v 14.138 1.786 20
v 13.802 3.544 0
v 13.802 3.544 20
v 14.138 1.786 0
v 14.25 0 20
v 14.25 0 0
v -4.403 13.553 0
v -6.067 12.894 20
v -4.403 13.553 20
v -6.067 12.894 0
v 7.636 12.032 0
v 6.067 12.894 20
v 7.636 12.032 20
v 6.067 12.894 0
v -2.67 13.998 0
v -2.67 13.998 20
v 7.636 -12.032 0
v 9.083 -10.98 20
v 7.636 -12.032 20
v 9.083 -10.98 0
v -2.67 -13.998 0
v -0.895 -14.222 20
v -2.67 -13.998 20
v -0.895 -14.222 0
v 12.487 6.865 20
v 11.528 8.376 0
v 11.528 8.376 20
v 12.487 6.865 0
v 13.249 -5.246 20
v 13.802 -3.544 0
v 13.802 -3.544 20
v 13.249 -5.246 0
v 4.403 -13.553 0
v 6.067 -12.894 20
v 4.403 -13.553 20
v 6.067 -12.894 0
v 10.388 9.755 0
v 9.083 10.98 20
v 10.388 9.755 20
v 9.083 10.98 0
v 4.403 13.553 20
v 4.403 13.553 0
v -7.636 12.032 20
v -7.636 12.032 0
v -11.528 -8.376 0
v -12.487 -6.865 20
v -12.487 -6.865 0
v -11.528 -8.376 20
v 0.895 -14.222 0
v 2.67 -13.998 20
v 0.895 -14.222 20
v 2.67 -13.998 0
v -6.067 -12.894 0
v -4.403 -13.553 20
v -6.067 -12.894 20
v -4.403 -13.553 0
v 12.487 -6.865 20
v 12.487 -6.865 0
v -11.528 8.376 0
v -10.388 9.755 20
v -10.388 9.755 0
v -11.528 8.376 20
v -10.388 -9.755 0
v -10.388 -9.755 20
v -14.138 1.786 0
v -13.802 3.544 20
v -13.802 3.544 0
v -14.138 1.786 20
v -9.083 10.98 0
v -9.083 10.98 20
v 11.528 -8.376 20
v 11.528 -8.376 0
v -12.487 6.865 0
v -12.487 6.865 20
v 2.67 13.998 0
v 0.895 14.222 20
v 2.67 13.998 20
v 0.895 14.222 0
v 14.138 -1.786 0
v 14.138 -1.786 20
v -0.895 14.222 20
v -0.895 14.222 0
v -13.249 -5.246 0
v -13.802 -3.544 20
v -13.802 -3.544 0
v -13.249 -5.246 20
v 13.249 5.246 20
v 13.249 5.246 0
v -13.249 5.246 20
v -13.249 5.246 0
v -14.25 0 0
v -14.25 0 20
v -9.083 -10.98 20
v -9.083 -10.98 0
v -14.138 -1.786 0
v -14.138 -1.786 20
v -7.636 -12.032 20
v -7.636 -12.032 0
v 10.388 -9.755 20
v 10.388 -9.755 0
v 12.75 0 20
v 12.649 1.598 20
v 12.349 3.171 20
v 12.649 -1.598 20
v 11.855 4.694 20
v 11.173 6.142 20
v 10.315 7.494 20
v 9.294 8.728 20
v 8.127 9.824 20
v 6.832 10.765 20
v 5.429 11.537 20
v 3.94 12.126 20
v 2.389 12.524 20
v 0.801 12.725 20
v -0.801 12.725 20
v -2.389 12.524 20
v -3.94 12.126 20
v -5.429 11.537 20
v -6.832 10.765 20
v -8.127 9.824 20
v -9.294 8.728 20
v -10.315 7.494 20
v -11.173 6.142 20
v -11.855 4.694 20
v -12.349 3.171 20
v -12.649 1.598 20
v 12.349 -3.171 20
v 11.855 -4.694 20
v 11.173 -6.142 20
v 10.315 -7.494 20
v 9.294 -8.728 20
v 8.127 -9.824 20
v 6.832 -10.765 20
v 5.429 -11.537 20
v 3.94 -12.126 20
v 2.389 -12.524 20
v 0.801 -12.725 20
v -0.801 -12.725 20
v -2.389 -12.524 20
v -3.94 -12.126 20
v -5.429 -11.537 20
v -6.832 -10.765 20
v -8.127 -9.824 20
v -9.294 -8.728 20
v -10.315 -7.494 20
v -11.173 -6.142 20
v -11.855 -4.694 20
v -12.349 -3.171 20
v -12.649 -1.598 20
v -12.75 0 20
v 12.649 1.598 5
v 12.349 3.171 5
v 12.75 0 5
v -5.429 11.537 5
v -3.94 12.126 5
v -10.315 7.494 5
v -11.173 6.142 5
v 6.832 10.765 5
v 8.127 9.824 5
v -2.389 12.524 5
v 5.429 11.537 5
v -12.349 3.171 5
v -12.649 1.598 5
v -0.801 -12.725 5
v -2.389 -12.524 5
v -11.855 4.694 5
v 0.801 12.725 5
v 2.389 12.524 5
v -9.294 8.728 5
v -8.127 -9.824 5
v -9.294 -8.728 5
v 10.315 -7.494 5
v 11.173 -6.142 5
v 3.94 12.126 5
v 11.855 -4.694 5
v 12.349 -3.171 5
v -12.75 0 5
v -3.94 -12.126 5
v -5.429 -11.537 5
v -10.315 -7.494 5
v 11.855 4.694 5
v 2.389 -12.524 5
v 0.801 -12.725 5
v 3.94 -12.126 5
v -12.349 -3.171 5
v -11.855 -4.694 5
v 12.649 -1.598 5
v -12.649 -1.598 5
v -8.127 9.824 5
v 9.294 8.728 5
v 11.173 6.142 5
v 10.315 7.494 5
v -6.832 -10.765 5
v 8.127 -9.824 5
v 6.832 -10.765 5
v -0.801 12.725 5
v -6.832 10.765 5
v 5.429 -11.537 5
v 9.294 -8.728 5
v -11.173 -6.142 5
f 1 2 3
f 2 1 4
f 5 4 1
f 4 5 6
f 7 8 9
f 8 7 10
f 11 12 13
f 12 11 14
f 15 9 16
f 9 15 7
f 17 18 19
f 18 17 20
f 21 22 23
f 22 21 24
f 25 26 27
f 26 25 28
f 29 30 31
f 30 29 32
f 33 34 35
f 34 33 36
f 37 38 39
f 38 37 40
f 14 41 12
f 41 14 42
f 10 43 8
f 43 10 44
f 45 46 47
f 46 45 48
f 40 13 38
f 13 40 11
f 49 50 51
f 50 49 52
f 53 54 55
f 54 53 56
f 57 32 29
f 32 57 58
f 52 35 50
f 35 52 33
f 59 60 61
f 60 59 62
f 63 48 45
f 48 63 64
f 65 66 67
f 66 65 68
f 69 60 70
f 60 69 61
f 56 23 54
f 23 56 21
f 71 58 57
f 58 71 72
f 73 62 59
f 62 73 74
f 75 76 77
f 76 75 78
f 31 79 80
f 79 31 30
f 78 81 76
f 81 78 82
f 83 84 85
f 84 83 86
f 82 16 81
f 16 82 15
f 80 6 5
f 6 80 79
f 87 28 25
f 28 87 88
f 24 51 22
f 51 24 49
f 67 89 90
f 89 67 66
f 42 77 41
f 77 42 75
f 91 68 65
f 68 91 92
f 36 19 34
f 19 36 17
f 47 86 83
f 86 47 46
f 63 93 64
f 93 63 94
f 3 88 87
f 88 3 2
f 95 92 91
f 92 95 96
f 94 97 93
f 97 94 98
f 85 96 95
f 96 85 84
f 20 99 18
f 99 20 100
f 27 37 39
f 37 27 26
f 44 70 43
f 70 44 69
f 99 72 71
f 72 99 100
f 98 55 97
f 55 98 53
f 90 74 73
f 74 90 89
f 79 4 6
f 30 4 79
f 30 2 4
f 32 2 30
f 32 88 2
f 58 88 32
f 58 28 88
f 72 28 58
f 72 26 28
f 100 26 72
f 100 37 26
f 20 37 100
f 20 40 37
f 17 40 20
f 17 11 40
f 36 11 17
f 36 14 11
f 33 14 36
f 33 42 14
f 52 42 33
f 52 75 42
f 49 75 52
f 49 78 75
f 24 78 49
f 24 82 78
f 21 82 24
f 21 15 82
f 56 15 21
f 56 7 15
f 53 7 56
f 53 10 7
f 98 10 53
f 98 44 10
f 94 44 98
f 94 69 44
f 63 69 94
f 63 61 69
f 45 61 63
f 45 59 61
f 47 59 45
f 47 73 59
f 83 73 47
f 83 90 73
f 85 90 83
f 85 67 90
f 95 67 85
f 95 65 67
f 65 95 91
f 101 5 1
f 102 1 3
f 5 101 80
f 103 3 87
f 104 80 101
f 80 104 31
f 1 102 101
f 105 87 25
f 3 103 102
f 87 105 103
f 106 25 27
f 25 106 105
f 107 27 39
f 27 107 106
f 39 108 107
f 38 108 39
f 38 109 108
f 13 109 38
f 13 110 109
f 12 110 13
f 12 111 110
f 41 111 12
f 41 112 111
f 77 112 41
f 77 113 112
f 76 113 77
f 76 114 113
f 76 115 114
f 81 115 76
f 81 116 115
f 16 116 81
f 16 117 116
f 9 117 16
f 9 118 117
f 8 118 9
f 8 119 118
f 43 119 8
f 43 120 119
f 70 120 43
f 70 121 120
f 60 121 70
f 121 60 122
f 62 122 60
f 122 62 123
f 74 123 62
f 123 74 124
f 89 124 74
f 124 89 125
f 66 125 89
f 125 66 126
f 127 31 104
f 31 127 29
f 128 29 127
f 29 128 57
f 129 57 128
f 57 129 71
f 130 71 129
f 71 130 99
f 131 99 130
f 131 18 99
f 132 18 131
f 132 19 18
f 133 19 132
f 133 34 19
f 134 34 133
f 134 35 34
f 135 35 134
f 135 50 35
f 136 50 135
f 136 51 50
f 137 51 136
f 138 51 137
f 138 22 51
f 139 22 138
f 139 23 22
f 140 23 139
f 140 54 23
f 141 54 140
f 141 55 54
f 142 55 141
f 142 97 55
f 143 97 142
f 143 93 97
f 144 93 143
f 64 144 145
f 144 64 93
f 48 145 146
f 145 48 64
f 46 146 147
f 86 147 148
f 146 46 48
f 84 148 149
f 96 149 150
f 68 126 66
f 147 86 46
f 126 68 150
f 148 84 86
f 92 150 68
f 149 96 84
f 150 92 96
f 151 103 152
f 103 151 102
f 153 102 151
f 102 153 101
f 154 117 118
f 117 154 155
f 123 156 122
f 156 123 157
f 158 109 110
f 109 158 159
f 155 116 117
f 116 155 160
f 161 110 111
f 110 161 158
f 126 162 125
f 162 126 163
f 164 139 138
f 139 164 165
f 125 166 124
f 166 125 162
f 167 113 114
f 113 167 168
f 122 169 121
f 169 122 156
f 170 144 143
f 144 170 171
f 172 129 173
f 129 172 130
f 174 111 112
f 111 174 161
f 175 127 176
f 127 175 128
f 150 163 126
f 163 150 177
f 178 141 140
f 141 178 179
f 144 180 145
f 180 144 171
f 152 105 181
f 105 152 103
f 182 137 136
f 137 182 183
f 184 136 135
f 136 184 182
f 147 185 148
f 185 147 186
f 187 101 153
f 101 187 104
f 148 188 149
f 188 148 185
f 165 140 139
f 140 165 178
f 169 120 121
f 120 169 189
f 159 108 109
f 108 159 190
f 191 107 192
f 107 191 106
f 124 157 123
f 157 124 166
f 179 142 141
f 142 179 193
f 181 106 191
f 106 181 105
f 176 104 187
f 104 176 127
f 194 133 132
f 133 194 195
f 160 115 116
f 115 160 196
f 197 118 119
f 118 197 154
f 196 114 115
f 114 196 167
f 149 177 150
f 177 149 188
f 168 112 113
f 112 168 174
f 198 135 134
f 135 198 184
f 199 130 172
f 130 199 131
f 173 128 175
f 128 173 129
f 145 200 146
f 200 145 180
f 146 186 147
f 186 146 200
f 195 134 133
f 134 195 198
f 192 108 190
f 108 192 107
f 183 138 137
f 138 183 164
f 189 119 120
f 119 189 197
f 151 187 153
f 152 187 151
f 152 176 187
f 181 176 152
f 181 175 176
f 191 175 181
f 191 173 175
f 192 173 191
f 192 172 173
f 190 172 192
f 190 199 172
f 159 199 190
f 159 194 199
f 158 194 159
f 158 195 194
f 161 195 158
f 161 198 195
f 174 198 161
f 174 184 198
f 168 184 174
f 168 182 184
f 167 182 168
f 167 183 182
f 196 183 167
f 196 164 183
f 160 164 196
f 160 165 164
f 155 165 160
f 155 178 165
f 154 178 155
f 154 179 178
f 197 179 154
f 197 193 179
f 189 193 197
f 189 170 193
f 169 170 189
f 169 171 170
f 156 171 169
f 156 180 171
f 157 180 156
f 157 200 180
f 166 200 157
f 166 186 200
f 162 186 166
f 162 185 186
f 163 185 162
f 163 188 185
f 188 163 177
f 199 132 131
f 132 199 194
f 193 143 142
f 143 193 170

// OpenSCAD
/*
    This is a simple cap for a rounded pipe. Uses include:
    - capping PVC pipe
    - chair foot
    - cup or bowl
    
    Author: Alex Kazim
*/

/* [Main] */

// diameter of the pipe to cap
inner_diam_top = 25.5;

// top wall thickness
wall_thickness_top = 3;

// diameter of the pipe to cap
inner_diam_base = 25.5;

// thickness at the base
wall_thickness_base = 3;

// height of the cap
height = 20;

// thickness of the floor
floor_thickness = 5;

/* [Hidden] */

$fn = 50;

AKRoundCap(inner_diam_top,wall_thickness_top,inner_diam_base,wall_thickness_base,height,floor_thickness);

// Open-ended round end-cap; some examples:
// - pipe or round shaft
// - chair leg
// - cup or bowl
// 
// idt - inner diameter at top of cap (open-end)
// wtt - wall thickness at top of cap
// idb - inner diameter at base of cap (closed-end)
// wtb - wall thickness at base of cap
// h - z-height of cap
// ft - floor thickness
module AKRoundCap(idt,wtt,idb,wtb,h,ft) {
    outer_radius_base = (idb + wtb)/2;
    outer_radius_top = (idt + wtt)/2;
    
    difference() {
        cylinder(h,outer_radius_base,outer_radius_top);
        translate([0,0,ft]) {
            cylinder(h-ft,idb/2,idt/2);
        }
    }
}
